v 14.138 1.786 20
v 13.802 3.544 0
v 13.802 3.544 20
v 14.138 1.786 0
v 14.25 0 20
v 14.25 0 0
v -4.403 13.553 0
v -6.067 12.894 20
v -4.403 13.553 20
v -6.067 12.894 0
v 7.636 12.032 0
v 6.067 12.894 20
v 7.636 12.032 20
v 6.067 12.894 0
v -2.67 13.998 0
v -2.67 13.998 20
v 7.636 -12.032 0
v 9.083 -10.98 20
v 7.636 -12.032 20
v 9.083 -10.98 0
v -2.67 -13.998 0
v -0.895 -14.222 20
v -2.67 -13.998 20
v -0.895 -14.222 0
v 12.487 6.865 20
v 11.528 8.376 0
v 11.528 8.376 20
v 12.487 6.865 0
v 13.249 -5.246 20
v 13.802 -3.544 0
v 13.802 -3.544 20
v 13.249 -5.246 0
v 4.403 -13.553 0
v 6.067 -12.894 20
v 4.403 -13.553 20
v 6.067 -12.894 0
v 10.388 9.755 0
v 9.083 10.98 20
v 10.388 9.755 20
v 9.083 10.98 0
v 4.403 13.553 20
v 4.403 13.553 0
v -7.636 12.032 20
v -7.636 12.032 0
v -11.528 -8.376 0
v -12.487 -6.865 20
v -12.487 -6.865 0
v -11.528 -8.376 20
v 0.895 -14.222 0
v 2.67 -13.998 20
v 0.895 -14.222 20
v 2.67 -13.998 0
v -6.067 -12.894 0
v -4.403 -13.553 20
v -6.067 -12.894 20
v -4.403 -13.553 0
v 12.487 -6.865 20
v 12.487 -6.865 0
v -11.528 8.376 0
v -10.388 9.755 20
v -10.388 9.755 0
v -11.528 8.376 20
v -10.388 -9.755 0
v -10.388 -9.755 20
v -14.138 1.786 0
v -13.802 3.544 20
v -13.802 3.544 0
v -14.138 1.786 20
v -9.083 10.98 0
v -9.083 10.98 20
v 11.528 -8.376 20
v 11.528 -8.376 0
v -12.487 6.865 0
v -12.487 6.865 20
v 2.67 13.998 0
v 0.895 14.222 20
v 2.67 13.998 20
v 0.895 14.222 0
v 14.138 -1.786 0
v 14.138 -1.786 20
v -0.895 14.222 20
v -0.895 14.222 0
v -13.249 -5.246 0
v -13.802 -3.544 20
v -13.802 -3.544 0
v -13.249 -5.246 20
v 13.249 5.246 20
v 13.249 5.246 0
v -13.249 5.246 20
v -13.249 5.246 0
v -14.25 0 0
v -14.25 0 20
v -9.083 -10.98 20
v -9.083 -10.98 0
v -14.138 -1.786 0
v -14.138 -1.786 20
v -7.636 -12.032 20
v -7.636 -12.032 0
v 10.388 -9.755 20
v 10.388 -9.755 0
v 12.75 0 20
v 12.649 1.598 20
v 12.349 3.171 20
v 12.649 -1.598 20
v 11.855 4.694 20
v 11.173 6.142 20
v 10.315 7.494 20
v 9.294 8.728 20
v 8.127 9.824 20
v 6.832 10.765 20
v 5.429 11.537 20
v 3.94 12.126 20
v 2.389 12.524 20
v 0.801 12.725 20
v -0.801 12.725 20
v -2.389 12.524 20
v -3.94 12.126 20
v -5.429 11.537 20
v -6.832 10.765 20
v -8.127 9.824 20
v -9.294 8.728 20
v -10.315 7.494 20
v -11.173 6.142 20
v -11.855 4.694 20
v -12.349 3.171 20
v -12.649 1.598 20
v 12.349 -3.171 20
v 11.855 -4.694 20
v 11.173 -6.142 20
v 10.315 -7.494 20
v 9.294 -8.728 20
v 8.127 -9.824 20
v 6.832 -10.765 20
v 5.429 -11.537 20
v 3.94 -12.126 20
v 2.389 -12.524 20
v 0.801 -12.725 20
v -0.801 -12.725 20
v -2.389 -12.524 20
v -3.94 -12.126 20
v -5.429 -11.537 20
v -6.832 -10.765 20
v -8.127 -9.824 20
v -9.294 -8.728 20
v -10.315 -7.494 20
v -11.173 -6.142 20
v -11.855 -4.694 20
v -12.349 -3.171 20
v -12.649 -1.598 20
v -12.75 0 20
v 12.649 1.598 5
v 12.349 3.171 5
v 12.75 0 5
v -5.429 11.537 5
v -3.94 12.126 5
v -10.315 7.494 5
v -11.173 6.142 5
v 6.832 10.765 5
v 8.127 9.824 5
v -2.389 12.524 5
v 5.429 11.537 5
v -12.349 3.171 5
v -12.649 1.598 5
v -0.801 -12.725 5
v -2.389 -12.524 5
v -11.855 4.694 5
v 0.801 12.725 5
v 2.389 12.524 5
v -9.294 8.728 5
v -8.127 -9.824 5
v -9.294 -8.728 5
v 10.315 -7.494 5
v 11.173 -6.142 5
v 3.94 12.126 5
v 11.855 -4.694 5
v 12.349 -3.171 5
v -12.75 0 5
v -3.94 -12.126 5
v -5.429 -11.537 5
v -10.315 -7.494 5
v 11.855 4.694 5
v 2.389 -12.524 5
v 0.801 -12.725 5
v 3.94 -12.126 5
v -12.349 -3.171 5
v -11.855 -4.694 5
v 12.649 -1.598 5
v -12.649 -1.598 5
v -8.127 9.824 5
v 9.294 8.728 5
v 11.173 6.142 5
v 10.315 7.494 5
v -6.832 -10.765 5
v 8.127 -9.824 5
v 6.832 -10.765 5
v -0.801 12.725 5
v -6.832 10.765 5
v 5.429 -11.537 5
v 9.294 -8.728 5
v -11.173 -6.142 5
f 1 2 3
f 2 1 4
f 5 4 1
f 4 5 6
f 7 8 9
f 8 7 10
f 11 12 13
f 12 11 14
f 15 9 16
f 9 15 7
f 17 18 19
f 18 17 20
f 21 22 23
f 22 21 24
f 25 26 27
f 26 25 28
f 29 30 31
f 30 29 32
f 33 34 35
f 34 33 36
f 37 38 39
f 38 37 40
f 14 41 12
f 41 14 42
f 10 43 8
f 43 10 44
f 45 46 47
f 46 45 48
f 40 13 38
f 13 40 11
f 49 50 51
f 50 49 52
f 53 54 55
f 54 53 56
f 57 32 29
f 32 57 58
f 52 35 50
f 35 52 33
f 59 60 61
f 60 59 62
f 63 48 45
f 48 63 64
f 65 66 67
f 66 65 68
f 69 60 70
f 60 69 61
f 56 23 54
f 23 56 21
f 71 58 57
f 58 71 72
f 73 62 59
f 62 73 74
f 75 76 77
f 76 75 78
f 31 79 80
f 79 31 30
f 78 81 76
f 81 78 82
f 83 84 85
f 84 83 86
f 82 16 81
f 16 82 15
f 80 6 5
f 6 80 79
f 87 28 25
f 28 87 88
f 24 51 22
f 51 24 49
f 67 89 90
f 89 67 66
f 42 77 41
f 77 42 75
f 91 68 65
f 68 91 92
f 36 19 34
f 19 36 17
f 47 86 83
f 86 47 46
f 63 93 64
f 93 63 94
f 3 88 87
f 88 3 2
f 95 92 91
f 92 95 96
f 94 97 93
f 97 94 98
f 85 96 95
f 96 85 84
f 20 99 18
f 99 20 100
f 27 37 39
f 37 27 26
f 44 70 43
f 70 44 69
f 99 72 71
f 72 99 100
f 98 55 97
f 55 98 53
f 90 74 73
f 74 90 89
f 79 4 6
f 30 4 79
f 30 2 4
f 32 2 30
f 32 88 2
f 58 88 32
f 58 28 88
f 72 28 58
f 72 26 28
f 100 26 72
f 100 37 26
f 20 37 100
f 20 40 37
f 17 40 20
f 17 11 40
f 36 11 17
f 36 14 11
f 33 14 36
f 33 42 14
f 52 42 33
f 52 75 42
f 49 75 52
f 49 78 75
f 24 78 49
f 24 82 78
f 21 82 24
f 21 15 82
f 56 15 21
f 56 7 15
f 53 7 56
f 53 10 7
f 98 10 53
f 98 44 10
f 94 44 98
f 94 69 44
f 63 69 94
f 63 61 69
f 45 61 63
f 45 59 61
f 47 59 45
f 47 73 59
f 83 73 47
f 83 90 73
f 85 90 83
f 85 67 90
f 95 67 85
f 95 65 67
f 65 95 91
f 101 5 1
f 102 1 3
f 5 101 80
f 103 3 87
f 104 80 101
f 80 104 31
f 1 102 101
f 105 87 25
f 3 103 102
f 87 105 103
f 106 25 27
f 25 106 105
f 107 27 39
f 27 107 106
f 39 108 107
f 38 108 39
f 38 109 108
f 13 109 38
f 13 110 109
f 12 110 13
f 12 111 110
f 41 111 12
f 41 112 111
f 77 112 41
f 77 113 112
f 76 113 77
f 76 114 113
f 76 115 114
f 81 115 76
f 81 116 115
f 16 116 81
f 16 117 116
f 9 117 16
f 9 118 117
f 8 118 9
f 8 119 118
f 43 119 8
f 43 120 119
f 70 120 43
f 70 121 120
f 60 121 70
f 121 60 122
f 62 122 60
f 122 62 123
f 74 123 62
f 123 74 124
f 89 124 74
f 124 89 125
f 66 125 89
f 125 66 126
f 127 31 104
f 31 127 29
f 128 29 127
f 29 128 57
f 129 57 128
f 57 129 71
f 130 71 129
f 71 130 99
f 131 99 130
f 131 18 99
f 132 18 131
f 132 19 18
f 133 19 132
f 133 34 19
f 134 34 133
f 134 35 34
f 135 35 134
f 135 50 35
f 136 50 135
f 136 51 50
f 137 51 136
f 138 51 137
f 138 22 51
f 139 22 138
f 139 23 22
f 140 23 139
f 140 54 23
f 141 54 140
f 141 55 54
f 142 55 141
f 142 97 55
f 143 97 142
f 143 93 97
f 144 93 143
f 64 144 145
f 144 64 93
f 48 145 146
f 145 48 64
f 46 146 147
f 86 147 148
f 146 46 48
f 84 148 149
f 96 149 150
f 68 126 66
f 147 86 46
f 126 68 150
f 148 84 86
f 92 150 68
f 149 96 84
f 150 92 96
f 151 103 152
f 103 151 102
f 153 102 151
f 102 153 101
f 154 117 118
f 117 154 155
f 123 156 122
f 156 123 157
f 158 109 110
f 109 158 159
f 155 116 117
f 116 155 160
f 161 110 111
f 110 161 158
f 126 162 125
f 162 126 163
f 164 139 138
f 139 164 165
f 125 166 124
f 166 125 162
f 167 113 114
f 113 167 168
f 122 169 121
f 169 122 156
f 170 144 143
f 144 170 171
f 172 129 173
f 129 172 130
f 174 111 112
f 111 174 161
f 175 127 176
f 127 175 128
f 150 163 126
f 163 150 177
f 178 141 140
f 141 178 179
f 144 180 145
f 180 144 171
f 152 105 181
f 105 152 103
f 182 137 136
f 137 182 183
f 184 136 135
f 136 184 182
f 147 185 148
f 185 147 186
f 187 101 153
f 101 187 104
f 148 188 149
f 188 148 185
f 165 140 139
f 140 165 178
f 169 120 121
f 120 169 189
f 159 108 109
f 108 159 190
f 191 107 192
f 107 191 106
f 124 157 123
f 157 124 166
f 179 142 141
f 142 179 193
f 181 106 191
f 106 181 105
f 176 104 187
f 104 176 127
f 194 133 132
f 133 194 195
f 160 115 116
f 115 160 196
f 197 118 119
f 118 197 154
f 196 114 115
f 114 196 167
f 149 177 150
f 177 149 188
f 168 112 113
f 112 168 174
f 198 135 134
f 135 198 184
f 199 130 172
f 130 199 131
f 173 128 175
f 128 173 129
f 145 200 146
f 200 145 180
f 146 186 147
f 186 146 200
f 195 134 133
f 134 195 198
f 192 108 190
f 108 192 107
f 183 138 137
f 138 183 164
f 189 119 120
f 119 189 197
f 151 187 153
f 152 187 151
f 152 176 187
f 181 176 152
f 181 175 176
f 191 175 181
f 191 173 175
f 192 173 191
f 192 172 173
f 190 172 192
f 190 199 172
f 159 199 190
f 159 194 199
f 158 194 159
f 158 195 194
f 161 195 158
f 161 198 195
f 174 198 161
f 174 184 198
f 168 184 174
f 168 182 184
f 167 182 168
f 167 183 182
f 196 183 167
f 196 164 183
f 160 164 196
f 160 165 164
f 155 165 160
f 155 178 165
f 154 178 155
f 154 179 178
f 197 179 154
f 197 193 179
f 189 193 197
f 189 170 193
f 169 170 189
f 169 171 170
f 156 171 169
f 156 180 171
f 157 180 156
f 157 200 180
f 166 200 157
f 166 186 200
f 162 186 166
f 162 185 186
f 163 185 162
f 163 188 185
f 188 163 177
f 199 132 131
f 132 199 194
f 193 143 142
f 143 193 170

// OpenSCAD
/*
    This is a simple cap for a rounded pipe. Uses include:
    - capping PVC pipe
    - chair foot
    - cup or bowl
    
    Author: Alex Kazim
*/

/* [Main] */

// diameter of the pipe to cap
inner_diam_top = 25.5;

// top wall thickness
wall_thickness_top = 3;

// diameter of the pipe to cap
inner_diam_base = 25.5;

// thickness at the base
wall_thickness_base = 3;

// height of the cap
height = 20;

// thickness of the floor
floor_thickness = 5;

/* [Hidden] */

$fn = 50;

AKRoundCap(inner_diam_top,wall_thickness_top,inner_diam_base,wall_thickness_base,height,floor_thickness);

// Open-ended round end-cap; some examples:
// - pipe or round shaft
// - chair leg
// - cup or bowl
// 
// idt - inner diameter at top of cap (open-end)
// wtt - wall thickness at top of cap
// idb - inner diameter at base of cap (closed-end)
// wtb - wall thickness at base of cap
// h - z-height of cap
// ft - floor thickness
module AKRoundCap(idt,wtt,idb,wtb,h,ft) {
    outer_radius_base = (idb + wtb)/2;
    outer_radius_top = (idt + wtt)/2;
    
    difference() {
        cylinder(h,outer_radius_base,outer_radius_top);
        translate([0,0,ft]) {
            cylinder(h-ft,idb/2,idt/2);
        }
    }
}
